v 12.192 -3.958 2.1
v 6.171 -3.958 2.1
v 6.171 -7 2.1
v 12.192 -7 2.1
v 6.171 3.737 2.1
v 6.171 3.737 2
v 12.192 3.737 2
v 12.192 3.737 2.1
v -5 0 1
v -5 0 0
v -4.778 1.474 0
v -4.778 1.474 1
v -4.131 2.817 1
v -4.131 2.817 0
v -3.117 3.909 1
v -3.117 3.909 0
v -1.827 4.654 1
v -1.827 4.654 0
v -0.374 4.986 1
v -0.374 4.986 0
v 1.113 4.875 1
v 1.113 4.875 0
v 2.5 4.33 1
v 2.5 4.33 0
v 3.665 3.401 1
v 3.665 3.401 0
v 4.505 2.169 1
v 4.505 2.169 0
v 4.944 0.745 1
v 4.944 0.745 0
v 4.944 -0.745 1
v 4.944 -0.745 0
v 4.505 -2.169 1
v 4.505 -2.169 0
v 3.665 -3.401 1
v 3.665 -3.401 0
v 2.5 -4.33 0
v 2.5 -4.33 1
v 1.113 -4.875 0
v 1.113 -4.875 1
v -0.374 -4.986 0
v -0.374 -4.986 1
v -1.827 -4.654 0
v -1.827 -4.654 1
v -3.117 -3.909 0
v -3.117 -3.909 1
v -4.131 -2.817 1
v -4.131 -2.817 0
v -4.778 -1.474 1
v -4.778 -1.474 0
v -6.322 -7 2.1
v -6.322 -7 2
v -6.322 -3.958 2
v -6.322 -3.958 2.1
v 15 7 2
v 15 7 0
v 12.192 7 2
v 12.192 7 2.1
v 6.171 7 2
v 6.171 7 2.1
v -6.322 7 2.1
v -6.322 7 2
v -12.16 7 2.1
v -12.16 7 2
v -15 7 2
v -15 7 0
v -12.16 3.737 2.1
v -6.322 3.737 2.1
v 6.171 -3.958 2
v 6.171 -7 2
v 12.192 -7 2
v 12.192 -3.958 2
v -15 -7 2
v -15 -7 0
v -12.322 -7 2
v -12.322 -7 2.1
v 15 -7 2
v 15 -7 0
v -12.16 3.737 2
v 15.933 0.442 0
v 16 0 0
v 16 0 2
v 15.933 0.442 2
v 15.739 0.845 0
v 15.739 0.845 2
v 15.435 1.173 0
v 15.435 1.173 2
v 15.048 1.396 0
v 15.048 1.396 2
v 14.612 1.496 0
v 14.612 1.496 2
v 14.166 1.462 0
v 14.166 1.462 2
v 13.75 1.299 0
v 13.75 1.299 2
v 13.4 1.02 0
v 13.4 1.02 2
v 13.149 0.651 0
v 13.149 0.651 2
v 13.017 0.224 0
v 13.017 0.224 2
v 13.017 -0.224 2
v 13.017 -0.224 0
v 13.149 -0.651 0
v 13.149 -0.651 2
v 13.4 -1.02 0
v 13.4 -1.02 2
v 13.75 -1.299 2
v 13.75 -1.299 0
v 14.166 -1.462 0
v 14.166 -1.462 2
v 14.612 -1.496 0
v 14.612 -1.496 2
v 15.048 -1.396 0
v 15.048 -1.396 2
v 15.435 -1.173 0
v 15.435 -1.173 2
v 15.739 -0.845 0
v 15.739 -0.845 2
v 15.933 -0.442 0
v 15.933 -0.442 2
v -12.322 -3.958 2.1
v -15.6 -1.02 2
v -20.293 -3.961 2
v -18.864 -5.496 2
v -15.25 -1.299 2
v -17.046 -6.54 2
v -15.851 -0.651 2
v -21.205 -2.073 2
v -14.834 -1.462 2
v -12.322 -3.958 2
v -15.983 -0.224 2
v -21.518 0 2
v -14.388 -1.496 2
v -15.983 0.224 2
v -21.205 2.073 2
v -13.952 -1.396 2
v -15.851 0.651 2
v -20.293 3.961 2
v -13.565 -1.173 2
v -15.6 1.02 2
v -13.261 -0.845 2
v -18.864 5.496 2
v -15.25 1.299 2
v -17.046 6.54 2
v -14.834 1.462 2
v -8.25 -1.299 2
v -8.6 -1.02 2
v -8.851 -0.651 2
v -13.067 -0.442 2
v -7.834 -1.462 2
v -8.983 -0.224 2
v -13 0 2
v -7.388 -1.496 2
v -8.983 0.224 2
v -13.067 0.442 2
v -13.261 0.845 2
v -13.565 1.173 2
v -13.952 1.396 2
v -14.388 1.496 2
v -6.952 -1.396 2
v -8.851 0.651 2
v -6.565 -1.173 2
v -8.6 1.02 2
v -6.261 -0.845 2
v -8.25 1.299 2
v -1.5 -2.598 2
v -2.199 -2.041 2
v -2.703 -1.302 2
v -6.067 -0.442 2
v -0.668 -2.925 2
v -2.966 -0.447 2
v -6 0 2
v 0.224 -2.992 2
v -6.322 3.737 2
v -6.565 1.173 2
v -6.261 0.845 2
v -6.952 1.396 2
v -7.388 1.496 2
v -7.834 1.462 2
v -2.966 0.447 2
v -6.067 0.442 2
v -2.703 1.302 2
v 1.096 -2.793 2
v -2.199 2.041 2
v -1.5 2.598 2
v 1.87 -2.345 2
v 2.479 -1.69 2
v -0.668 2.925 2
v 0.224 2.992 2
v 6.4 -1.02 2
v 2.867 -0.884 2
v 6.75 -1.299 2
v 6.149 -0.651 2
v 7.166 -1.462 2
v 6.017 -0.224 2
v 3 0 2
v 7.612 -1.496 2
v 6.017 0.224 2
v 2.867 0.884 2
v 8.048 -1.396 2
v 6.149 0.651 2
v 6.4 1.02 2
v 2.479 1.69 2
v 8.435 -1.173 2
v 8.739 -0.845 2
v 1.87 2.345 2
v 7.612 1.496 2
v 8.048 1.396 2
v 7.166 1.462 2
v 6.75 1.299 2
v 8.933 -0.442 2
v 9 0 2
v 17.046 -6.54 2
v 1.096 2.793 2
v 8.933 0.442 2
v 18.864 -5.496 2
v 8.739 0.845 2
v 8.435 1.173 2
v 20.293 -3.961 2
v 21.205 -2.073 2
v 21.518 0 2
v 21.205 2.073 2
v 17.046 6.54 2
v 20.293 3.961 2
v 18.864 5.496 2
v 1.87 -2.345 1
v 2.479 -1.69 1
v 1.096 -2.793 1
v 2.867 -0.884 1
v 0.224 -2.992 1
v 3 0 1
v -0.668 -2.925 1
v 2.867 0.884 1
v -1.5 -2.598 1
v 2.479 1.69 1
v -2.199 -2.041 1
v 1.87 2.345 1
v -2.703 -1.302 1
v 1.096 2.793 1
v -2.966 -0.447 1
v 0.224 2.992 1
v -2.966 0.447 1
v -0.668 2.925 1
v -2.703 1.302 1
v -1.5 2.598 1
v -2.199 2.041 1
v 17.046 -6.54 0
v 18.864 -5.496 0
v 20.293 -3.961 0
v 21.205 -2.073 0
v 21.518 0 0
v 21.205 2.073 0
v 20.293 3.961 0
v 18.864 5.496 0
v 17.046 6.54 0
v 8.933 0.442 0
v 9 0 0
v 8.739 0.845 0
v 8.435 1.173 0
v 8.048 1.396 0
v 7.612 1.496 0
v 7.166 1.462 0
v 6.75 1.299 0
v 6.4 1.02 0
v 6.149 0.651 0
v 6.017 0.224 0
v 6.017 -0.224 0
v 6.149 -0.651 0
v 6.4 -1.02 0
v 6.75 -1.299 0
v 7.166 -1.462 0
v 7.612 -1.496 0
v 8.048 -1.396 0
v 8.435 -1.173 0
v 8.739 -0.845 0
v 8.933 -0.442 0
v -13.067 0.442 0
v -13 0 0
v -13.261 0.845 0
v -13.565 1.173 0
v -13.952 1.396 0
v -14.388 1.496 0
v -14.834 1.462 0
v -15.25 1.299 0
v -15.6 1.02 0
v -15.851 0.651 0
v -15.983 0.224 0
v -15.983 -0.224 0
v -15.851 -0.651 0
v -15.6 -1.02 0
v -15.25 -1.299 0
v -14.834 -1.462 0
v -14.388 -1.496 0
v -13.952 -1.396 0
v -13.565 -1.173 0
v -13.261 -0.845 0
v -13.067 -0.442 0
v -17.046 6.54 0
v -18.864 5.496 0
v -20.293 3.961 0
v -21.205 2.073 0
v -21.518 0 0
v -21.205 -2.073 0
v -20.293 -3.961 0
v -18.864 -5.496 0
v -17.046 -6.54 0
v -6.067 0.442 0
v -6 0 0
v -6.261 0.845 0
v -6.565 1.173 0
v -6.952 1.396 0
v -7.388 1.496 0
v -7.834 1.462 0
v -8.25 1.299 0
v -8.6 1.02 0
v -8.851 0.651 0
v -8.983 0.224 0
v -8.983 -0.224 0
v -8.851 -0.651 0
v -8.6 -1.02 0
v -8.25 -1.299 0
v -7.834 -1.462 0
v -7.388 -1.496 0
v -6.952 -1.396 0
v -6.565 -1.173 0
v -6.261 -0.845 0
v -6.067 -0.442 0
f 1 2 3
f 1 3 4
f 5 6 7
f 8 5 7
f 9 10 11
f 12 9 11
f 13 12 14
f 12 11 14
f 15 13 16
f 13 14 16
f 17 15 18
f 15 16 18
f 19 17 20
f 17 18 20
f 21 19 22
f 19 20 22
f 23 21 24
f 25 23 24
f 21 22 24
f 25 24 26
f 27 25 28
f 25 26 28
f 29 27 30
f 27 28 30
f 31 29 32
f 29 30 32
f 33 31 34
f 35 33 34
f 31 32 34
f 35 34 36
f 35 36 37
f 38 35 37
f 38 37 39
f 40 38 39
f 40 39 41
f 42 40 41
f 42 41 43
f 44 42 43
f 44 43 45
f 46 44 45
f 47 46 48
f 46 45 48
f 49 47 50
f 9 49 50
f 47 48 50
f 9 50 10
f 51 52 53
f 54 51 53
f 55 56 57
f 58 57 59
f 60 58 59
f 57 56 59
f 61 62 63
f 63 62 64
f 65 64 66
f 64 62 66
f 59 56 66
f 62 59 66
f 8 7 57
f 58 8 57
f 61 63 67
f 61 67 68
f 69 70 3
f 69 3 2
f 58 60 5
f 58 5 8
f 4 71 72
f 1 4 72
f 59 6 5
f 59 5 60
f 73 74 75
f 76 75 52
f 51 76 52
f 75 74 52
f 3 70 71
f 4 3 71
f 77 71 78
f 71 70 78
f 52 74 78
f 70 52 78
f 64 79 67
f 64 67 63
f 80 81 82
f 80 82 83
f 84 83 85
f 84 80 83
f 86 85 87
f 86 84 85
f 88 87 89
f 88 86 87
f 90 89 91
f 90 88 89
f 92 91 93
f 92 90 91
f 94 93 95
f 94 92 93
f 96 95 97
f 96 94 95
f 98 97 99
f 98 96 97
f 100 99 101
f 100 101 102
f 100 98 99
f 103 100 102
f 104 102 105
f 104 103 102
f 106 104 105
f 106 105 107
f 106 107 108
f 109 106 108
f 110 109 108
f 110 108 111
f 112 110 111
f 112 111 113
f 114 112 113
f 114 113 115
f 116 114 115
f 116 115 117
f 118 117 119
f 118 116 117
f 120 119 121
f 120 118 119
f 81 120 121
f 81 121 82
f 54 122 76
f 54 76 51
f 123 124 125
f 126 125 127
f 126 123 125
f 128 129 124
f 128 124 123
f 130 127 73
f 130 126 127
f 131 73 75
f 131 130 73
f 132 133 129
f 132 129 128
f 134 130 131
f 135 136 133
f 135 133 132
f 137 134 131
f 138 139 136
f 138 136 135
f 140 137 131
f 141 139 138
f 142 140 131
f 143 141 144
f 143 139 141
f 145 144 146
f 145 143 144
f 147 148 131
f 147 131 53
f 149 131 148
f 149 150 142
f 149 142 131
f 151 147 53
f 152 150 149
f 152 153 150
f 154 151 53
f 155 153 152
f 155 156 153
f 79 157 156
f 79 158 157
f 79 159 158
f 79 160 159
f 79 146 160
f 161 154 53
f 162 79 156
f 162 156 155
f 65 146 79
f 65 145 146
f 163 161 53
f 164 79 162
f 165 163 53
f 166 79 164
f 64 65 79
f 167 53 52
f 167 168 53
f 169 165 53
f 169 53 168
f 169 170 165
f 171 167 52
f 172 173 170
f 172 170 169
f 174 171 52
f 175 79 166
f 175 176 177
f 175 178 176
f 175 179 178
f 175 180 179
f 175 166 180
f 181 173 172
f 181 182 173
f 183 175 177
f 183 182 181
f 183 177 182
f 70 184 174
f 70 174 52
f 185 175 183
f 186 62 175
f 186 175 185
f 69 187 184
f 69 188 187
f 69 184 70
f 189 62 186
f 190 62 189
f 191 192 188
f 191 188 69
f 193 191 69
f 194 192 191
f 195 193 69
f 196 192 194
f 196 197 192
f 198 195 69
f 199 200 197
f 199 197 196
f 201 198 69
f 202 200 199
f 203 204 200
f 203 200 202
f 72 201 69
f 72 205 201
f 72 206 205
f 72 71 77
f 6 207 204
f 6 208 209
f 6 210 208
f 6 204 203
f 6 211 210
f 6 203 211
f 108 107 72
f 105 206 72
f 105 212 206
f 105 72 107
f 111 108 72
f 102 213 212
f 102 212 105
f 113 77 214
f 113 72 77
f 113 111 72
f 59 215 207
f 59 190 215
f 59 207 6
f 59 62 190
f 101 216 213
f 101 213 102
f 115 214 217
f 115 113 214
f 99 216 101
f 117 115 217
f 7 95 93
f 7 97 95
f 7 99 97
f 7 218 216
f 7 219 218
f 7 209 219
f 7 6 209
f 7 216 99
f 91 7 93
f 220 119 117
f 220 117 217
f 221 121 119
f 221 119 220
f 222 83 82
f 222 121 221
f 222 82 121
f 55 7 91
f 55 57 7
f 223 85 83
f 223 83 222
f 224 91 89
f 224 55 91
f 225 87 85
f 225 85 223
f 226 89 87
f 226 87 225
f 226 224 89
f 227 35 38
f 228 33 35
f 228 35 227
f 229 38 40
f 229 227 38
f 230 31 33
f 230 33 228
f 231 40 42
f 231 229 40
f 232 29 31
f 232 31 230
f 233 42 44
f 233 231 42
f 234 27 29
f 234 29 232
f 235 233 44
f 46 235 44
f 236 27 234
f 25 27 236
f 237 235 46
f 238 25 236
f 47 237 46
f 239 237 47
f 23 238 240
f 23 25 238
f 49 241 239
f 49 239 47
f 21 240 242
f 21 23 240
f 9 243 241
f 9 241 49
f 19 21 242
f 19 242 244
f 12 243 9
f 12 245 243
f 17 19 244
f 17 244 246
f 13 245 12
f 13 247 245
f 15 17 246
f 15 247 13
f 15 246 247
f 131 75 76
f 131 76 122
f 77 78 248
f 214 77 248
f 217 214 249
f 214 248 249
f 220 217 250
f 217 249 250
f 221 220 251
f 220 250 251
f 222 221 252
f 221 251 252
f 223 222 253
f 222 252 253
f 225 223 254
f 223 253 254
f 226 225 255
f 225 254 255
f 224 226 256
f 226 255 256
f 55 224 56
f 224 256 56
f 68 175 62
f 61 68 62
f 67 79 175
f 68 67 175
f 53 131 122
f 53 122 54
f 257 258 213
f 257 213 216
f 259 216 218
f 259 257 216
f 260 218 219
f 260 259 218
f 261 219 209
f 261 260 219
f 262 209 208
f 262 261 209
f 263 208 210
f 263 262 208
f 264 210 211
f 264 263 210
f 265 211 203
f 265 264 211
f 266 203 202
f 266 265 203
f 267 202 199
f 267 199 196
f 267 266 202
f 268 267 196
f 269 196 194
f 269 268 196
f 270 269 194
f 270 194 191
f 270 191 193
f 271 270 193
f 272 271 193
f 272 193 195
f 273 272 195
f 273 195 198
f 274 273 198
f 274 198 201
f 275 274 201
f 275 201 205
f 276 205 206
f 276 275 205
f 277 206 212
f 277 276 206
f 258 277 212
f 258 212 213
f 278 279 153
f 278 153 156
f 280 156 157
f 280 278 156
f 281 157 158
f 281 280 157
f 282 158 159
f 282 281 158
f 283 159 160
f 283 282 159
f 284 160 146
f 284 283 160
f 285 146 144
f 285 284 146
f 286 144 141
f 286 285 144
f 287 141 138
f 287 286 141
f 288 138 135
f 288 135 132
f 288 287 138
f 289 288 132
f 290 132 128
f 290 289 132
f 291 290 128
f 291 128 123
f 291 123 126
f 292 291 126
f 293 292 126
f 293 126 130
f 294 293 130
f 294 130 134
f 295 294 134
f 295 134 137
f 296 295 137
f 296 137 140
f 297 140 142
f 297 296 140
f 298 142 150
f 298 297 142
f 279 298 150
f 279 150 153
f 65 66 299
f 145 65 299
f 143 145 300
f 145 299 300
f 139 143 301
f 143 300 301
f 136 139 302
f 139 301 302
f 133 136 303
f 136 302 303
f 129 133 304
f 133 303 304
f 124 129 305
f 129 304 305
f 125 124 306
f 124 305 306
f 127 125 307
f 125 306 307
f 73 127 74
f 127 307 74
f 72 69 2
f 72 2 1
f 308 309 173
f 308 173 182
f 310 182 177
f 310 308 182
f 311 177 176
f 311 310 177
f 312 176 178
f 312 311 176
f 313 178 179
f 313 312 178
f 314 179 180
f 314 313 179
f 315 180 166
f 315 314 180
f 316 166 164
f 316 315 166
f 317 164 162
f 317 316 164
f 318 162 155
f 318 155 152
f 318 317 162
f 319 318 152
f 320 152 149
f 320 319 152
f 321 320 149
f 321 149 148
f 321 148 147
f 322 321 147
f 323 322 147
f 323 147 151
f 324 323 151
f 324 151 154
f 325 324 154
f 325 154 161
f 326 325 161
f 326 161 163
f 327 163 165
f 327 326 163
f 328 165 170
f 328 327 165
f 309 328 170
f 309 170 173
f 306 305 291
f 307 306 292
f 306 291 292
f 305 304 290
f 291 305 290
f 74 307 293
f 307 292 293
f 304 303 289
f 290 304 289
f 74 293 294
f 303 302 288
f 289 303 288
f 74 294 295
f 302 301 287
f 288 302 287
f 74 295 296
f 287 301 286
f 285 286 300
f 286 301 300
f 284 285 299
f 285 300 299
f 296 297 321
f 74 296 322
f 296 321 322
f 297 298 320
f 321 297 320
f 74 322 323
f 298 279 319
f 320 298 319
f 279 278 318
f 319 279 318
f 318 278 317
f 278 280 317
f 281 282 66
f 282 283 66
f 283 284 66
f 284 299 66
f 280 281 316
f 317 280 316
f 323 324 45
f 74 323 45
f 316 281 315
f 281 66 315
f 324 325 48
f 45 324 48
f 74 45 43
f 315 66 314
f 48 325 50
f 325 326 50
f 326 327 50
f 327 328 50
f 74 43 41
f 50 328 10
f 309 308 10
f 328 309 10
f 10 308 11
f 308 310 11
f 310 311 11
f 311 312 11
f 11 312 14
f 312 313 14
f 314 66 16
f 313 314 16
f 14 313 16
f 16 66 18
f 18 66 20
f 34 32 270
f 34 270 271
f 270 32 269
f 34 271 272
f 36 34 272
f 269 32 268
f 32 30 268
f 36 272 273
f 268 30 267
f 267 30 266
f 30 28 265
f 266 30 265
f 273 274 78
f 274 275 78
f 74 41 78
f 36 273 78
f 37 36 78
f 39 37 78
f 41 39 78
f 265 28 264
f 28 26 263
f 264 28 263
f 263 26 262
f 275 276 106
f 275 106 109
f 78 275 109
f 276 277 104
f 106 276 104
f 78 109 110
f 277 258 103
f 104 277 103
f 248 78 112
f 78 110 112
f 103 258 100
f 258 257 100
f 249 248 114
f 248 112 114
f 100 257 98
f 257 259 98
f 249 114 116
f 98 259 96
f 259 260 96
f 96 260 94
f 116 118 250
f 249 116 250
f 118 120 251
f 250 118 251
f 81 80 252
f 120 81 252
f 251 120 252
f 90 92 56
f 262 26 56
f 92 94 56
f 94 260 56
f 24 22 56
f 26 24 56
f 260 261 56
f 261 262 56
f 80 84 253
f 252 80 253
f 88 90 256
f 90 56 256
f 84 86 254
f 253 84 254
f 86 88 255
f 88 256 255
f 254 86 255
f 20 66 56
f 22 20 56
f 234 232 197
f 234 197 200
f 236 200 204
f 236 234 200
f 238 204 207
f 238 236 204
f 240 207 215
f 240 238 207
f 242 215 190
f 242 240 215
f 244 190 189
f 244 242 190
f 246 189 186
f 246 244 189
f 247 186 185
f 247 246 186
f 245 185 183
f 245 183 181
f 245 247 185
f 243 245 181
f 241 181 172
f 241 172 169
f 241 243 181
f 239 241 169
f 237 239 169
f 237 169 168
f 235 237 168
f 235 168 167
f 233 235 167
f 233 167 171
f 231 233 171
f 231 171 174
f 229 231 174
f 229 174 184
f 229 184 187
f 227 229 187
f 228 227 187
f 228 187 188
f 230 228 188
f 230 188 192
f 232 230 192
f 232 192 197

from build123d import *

# Parameters (mm, degrees)
SKETCH1_R           = 3
SKETCH1_R_2         = 1.5
BOSS_EXTRUDE1_DEPTH = 2
SKETCH2_W           = 6.020555891
SKETCH2_H           = 3.042269969
SKETCH2_H_2         = 3.263297615
SKETCH2_W_2         = 6
SKETCH2_W_3         = 5.83801195
BOSS_EXTRUDE2_DEPTH = 0.1
SKETCH3_R           = 5
CUT_EXTRUDE1_DEPTH  = 1


with BuildPart() as part:
    # Sketch1 → Boss-Extrude1 (new body)
    with BuildSketch(Plane.XY):
        with BuildLine():
            Line((-15, -7), (15, -7))
            ThreePointArc((15, -7), (21.517834424, 0), (15, 7))
            Line((15, 7), (-15, 7))
            ThreePointArc((-15, 7), (-21.517834424, 0), (-15, -7))
        make_face()
        Circle(SKETCH1_R, mode=Mode.SUBTRACT)
        with Locations((-14.5, 0)):
            Circle(SKETCH1_R_2, mode=Mode.SUBTRACT)
        with Locations((14.5, 0)):
            Circle(SKETCH1_R_2, mode=Mode.SUBTRACT)
        with Locations((-7.5, 0)):
            Circle(SKETCH1_R_2, mode=Mode.SUBTRACT)
        with Locations((7.5, 0)):
            Circle(SKETCH1_R_2, mode=Mode.SUBTRACT)
    extrude(amount=BOSS_EXTRUDE1_DEPTH)

    # Sketch2 → Boss-Extrude2 (add)
    with BuildSketch(Plane.XY.offset(2)):
        with Locations((9.181574615, -5.478865016)):
            Rectangle(SKETCH2_W, SKETCH2_H)
        with Locations((9.181574615, 5.368351193)):
            Rectangle(SKETCH2_W, SKETCH2_H_2)
        with Locations((-9.322339138, -5.478865016)):
            Rectangle(SKETCH2_W_2, SKETCH2_H)
        with Locations((-9.241345113, 5.368351193)):
            Rectangle(SKETCH2_W_3, SKETCH2_H_2)
    extrude(amount=BOSS_EXTRUDE2_DEPTH)

    # Sketch3 → Cut-Extrude1 (cut)
    with BuildSketch(Plane(origin=(0, 0, 0), x_dir=(-1, 0, 0), z_dir=(0, 0, -1))):
        Circle(SKETCH3_R)
    extrude(amount=-CUT_EXTRUDE1_DEPTH, mode=Mode.SUBTRACT)


solid = part.part
